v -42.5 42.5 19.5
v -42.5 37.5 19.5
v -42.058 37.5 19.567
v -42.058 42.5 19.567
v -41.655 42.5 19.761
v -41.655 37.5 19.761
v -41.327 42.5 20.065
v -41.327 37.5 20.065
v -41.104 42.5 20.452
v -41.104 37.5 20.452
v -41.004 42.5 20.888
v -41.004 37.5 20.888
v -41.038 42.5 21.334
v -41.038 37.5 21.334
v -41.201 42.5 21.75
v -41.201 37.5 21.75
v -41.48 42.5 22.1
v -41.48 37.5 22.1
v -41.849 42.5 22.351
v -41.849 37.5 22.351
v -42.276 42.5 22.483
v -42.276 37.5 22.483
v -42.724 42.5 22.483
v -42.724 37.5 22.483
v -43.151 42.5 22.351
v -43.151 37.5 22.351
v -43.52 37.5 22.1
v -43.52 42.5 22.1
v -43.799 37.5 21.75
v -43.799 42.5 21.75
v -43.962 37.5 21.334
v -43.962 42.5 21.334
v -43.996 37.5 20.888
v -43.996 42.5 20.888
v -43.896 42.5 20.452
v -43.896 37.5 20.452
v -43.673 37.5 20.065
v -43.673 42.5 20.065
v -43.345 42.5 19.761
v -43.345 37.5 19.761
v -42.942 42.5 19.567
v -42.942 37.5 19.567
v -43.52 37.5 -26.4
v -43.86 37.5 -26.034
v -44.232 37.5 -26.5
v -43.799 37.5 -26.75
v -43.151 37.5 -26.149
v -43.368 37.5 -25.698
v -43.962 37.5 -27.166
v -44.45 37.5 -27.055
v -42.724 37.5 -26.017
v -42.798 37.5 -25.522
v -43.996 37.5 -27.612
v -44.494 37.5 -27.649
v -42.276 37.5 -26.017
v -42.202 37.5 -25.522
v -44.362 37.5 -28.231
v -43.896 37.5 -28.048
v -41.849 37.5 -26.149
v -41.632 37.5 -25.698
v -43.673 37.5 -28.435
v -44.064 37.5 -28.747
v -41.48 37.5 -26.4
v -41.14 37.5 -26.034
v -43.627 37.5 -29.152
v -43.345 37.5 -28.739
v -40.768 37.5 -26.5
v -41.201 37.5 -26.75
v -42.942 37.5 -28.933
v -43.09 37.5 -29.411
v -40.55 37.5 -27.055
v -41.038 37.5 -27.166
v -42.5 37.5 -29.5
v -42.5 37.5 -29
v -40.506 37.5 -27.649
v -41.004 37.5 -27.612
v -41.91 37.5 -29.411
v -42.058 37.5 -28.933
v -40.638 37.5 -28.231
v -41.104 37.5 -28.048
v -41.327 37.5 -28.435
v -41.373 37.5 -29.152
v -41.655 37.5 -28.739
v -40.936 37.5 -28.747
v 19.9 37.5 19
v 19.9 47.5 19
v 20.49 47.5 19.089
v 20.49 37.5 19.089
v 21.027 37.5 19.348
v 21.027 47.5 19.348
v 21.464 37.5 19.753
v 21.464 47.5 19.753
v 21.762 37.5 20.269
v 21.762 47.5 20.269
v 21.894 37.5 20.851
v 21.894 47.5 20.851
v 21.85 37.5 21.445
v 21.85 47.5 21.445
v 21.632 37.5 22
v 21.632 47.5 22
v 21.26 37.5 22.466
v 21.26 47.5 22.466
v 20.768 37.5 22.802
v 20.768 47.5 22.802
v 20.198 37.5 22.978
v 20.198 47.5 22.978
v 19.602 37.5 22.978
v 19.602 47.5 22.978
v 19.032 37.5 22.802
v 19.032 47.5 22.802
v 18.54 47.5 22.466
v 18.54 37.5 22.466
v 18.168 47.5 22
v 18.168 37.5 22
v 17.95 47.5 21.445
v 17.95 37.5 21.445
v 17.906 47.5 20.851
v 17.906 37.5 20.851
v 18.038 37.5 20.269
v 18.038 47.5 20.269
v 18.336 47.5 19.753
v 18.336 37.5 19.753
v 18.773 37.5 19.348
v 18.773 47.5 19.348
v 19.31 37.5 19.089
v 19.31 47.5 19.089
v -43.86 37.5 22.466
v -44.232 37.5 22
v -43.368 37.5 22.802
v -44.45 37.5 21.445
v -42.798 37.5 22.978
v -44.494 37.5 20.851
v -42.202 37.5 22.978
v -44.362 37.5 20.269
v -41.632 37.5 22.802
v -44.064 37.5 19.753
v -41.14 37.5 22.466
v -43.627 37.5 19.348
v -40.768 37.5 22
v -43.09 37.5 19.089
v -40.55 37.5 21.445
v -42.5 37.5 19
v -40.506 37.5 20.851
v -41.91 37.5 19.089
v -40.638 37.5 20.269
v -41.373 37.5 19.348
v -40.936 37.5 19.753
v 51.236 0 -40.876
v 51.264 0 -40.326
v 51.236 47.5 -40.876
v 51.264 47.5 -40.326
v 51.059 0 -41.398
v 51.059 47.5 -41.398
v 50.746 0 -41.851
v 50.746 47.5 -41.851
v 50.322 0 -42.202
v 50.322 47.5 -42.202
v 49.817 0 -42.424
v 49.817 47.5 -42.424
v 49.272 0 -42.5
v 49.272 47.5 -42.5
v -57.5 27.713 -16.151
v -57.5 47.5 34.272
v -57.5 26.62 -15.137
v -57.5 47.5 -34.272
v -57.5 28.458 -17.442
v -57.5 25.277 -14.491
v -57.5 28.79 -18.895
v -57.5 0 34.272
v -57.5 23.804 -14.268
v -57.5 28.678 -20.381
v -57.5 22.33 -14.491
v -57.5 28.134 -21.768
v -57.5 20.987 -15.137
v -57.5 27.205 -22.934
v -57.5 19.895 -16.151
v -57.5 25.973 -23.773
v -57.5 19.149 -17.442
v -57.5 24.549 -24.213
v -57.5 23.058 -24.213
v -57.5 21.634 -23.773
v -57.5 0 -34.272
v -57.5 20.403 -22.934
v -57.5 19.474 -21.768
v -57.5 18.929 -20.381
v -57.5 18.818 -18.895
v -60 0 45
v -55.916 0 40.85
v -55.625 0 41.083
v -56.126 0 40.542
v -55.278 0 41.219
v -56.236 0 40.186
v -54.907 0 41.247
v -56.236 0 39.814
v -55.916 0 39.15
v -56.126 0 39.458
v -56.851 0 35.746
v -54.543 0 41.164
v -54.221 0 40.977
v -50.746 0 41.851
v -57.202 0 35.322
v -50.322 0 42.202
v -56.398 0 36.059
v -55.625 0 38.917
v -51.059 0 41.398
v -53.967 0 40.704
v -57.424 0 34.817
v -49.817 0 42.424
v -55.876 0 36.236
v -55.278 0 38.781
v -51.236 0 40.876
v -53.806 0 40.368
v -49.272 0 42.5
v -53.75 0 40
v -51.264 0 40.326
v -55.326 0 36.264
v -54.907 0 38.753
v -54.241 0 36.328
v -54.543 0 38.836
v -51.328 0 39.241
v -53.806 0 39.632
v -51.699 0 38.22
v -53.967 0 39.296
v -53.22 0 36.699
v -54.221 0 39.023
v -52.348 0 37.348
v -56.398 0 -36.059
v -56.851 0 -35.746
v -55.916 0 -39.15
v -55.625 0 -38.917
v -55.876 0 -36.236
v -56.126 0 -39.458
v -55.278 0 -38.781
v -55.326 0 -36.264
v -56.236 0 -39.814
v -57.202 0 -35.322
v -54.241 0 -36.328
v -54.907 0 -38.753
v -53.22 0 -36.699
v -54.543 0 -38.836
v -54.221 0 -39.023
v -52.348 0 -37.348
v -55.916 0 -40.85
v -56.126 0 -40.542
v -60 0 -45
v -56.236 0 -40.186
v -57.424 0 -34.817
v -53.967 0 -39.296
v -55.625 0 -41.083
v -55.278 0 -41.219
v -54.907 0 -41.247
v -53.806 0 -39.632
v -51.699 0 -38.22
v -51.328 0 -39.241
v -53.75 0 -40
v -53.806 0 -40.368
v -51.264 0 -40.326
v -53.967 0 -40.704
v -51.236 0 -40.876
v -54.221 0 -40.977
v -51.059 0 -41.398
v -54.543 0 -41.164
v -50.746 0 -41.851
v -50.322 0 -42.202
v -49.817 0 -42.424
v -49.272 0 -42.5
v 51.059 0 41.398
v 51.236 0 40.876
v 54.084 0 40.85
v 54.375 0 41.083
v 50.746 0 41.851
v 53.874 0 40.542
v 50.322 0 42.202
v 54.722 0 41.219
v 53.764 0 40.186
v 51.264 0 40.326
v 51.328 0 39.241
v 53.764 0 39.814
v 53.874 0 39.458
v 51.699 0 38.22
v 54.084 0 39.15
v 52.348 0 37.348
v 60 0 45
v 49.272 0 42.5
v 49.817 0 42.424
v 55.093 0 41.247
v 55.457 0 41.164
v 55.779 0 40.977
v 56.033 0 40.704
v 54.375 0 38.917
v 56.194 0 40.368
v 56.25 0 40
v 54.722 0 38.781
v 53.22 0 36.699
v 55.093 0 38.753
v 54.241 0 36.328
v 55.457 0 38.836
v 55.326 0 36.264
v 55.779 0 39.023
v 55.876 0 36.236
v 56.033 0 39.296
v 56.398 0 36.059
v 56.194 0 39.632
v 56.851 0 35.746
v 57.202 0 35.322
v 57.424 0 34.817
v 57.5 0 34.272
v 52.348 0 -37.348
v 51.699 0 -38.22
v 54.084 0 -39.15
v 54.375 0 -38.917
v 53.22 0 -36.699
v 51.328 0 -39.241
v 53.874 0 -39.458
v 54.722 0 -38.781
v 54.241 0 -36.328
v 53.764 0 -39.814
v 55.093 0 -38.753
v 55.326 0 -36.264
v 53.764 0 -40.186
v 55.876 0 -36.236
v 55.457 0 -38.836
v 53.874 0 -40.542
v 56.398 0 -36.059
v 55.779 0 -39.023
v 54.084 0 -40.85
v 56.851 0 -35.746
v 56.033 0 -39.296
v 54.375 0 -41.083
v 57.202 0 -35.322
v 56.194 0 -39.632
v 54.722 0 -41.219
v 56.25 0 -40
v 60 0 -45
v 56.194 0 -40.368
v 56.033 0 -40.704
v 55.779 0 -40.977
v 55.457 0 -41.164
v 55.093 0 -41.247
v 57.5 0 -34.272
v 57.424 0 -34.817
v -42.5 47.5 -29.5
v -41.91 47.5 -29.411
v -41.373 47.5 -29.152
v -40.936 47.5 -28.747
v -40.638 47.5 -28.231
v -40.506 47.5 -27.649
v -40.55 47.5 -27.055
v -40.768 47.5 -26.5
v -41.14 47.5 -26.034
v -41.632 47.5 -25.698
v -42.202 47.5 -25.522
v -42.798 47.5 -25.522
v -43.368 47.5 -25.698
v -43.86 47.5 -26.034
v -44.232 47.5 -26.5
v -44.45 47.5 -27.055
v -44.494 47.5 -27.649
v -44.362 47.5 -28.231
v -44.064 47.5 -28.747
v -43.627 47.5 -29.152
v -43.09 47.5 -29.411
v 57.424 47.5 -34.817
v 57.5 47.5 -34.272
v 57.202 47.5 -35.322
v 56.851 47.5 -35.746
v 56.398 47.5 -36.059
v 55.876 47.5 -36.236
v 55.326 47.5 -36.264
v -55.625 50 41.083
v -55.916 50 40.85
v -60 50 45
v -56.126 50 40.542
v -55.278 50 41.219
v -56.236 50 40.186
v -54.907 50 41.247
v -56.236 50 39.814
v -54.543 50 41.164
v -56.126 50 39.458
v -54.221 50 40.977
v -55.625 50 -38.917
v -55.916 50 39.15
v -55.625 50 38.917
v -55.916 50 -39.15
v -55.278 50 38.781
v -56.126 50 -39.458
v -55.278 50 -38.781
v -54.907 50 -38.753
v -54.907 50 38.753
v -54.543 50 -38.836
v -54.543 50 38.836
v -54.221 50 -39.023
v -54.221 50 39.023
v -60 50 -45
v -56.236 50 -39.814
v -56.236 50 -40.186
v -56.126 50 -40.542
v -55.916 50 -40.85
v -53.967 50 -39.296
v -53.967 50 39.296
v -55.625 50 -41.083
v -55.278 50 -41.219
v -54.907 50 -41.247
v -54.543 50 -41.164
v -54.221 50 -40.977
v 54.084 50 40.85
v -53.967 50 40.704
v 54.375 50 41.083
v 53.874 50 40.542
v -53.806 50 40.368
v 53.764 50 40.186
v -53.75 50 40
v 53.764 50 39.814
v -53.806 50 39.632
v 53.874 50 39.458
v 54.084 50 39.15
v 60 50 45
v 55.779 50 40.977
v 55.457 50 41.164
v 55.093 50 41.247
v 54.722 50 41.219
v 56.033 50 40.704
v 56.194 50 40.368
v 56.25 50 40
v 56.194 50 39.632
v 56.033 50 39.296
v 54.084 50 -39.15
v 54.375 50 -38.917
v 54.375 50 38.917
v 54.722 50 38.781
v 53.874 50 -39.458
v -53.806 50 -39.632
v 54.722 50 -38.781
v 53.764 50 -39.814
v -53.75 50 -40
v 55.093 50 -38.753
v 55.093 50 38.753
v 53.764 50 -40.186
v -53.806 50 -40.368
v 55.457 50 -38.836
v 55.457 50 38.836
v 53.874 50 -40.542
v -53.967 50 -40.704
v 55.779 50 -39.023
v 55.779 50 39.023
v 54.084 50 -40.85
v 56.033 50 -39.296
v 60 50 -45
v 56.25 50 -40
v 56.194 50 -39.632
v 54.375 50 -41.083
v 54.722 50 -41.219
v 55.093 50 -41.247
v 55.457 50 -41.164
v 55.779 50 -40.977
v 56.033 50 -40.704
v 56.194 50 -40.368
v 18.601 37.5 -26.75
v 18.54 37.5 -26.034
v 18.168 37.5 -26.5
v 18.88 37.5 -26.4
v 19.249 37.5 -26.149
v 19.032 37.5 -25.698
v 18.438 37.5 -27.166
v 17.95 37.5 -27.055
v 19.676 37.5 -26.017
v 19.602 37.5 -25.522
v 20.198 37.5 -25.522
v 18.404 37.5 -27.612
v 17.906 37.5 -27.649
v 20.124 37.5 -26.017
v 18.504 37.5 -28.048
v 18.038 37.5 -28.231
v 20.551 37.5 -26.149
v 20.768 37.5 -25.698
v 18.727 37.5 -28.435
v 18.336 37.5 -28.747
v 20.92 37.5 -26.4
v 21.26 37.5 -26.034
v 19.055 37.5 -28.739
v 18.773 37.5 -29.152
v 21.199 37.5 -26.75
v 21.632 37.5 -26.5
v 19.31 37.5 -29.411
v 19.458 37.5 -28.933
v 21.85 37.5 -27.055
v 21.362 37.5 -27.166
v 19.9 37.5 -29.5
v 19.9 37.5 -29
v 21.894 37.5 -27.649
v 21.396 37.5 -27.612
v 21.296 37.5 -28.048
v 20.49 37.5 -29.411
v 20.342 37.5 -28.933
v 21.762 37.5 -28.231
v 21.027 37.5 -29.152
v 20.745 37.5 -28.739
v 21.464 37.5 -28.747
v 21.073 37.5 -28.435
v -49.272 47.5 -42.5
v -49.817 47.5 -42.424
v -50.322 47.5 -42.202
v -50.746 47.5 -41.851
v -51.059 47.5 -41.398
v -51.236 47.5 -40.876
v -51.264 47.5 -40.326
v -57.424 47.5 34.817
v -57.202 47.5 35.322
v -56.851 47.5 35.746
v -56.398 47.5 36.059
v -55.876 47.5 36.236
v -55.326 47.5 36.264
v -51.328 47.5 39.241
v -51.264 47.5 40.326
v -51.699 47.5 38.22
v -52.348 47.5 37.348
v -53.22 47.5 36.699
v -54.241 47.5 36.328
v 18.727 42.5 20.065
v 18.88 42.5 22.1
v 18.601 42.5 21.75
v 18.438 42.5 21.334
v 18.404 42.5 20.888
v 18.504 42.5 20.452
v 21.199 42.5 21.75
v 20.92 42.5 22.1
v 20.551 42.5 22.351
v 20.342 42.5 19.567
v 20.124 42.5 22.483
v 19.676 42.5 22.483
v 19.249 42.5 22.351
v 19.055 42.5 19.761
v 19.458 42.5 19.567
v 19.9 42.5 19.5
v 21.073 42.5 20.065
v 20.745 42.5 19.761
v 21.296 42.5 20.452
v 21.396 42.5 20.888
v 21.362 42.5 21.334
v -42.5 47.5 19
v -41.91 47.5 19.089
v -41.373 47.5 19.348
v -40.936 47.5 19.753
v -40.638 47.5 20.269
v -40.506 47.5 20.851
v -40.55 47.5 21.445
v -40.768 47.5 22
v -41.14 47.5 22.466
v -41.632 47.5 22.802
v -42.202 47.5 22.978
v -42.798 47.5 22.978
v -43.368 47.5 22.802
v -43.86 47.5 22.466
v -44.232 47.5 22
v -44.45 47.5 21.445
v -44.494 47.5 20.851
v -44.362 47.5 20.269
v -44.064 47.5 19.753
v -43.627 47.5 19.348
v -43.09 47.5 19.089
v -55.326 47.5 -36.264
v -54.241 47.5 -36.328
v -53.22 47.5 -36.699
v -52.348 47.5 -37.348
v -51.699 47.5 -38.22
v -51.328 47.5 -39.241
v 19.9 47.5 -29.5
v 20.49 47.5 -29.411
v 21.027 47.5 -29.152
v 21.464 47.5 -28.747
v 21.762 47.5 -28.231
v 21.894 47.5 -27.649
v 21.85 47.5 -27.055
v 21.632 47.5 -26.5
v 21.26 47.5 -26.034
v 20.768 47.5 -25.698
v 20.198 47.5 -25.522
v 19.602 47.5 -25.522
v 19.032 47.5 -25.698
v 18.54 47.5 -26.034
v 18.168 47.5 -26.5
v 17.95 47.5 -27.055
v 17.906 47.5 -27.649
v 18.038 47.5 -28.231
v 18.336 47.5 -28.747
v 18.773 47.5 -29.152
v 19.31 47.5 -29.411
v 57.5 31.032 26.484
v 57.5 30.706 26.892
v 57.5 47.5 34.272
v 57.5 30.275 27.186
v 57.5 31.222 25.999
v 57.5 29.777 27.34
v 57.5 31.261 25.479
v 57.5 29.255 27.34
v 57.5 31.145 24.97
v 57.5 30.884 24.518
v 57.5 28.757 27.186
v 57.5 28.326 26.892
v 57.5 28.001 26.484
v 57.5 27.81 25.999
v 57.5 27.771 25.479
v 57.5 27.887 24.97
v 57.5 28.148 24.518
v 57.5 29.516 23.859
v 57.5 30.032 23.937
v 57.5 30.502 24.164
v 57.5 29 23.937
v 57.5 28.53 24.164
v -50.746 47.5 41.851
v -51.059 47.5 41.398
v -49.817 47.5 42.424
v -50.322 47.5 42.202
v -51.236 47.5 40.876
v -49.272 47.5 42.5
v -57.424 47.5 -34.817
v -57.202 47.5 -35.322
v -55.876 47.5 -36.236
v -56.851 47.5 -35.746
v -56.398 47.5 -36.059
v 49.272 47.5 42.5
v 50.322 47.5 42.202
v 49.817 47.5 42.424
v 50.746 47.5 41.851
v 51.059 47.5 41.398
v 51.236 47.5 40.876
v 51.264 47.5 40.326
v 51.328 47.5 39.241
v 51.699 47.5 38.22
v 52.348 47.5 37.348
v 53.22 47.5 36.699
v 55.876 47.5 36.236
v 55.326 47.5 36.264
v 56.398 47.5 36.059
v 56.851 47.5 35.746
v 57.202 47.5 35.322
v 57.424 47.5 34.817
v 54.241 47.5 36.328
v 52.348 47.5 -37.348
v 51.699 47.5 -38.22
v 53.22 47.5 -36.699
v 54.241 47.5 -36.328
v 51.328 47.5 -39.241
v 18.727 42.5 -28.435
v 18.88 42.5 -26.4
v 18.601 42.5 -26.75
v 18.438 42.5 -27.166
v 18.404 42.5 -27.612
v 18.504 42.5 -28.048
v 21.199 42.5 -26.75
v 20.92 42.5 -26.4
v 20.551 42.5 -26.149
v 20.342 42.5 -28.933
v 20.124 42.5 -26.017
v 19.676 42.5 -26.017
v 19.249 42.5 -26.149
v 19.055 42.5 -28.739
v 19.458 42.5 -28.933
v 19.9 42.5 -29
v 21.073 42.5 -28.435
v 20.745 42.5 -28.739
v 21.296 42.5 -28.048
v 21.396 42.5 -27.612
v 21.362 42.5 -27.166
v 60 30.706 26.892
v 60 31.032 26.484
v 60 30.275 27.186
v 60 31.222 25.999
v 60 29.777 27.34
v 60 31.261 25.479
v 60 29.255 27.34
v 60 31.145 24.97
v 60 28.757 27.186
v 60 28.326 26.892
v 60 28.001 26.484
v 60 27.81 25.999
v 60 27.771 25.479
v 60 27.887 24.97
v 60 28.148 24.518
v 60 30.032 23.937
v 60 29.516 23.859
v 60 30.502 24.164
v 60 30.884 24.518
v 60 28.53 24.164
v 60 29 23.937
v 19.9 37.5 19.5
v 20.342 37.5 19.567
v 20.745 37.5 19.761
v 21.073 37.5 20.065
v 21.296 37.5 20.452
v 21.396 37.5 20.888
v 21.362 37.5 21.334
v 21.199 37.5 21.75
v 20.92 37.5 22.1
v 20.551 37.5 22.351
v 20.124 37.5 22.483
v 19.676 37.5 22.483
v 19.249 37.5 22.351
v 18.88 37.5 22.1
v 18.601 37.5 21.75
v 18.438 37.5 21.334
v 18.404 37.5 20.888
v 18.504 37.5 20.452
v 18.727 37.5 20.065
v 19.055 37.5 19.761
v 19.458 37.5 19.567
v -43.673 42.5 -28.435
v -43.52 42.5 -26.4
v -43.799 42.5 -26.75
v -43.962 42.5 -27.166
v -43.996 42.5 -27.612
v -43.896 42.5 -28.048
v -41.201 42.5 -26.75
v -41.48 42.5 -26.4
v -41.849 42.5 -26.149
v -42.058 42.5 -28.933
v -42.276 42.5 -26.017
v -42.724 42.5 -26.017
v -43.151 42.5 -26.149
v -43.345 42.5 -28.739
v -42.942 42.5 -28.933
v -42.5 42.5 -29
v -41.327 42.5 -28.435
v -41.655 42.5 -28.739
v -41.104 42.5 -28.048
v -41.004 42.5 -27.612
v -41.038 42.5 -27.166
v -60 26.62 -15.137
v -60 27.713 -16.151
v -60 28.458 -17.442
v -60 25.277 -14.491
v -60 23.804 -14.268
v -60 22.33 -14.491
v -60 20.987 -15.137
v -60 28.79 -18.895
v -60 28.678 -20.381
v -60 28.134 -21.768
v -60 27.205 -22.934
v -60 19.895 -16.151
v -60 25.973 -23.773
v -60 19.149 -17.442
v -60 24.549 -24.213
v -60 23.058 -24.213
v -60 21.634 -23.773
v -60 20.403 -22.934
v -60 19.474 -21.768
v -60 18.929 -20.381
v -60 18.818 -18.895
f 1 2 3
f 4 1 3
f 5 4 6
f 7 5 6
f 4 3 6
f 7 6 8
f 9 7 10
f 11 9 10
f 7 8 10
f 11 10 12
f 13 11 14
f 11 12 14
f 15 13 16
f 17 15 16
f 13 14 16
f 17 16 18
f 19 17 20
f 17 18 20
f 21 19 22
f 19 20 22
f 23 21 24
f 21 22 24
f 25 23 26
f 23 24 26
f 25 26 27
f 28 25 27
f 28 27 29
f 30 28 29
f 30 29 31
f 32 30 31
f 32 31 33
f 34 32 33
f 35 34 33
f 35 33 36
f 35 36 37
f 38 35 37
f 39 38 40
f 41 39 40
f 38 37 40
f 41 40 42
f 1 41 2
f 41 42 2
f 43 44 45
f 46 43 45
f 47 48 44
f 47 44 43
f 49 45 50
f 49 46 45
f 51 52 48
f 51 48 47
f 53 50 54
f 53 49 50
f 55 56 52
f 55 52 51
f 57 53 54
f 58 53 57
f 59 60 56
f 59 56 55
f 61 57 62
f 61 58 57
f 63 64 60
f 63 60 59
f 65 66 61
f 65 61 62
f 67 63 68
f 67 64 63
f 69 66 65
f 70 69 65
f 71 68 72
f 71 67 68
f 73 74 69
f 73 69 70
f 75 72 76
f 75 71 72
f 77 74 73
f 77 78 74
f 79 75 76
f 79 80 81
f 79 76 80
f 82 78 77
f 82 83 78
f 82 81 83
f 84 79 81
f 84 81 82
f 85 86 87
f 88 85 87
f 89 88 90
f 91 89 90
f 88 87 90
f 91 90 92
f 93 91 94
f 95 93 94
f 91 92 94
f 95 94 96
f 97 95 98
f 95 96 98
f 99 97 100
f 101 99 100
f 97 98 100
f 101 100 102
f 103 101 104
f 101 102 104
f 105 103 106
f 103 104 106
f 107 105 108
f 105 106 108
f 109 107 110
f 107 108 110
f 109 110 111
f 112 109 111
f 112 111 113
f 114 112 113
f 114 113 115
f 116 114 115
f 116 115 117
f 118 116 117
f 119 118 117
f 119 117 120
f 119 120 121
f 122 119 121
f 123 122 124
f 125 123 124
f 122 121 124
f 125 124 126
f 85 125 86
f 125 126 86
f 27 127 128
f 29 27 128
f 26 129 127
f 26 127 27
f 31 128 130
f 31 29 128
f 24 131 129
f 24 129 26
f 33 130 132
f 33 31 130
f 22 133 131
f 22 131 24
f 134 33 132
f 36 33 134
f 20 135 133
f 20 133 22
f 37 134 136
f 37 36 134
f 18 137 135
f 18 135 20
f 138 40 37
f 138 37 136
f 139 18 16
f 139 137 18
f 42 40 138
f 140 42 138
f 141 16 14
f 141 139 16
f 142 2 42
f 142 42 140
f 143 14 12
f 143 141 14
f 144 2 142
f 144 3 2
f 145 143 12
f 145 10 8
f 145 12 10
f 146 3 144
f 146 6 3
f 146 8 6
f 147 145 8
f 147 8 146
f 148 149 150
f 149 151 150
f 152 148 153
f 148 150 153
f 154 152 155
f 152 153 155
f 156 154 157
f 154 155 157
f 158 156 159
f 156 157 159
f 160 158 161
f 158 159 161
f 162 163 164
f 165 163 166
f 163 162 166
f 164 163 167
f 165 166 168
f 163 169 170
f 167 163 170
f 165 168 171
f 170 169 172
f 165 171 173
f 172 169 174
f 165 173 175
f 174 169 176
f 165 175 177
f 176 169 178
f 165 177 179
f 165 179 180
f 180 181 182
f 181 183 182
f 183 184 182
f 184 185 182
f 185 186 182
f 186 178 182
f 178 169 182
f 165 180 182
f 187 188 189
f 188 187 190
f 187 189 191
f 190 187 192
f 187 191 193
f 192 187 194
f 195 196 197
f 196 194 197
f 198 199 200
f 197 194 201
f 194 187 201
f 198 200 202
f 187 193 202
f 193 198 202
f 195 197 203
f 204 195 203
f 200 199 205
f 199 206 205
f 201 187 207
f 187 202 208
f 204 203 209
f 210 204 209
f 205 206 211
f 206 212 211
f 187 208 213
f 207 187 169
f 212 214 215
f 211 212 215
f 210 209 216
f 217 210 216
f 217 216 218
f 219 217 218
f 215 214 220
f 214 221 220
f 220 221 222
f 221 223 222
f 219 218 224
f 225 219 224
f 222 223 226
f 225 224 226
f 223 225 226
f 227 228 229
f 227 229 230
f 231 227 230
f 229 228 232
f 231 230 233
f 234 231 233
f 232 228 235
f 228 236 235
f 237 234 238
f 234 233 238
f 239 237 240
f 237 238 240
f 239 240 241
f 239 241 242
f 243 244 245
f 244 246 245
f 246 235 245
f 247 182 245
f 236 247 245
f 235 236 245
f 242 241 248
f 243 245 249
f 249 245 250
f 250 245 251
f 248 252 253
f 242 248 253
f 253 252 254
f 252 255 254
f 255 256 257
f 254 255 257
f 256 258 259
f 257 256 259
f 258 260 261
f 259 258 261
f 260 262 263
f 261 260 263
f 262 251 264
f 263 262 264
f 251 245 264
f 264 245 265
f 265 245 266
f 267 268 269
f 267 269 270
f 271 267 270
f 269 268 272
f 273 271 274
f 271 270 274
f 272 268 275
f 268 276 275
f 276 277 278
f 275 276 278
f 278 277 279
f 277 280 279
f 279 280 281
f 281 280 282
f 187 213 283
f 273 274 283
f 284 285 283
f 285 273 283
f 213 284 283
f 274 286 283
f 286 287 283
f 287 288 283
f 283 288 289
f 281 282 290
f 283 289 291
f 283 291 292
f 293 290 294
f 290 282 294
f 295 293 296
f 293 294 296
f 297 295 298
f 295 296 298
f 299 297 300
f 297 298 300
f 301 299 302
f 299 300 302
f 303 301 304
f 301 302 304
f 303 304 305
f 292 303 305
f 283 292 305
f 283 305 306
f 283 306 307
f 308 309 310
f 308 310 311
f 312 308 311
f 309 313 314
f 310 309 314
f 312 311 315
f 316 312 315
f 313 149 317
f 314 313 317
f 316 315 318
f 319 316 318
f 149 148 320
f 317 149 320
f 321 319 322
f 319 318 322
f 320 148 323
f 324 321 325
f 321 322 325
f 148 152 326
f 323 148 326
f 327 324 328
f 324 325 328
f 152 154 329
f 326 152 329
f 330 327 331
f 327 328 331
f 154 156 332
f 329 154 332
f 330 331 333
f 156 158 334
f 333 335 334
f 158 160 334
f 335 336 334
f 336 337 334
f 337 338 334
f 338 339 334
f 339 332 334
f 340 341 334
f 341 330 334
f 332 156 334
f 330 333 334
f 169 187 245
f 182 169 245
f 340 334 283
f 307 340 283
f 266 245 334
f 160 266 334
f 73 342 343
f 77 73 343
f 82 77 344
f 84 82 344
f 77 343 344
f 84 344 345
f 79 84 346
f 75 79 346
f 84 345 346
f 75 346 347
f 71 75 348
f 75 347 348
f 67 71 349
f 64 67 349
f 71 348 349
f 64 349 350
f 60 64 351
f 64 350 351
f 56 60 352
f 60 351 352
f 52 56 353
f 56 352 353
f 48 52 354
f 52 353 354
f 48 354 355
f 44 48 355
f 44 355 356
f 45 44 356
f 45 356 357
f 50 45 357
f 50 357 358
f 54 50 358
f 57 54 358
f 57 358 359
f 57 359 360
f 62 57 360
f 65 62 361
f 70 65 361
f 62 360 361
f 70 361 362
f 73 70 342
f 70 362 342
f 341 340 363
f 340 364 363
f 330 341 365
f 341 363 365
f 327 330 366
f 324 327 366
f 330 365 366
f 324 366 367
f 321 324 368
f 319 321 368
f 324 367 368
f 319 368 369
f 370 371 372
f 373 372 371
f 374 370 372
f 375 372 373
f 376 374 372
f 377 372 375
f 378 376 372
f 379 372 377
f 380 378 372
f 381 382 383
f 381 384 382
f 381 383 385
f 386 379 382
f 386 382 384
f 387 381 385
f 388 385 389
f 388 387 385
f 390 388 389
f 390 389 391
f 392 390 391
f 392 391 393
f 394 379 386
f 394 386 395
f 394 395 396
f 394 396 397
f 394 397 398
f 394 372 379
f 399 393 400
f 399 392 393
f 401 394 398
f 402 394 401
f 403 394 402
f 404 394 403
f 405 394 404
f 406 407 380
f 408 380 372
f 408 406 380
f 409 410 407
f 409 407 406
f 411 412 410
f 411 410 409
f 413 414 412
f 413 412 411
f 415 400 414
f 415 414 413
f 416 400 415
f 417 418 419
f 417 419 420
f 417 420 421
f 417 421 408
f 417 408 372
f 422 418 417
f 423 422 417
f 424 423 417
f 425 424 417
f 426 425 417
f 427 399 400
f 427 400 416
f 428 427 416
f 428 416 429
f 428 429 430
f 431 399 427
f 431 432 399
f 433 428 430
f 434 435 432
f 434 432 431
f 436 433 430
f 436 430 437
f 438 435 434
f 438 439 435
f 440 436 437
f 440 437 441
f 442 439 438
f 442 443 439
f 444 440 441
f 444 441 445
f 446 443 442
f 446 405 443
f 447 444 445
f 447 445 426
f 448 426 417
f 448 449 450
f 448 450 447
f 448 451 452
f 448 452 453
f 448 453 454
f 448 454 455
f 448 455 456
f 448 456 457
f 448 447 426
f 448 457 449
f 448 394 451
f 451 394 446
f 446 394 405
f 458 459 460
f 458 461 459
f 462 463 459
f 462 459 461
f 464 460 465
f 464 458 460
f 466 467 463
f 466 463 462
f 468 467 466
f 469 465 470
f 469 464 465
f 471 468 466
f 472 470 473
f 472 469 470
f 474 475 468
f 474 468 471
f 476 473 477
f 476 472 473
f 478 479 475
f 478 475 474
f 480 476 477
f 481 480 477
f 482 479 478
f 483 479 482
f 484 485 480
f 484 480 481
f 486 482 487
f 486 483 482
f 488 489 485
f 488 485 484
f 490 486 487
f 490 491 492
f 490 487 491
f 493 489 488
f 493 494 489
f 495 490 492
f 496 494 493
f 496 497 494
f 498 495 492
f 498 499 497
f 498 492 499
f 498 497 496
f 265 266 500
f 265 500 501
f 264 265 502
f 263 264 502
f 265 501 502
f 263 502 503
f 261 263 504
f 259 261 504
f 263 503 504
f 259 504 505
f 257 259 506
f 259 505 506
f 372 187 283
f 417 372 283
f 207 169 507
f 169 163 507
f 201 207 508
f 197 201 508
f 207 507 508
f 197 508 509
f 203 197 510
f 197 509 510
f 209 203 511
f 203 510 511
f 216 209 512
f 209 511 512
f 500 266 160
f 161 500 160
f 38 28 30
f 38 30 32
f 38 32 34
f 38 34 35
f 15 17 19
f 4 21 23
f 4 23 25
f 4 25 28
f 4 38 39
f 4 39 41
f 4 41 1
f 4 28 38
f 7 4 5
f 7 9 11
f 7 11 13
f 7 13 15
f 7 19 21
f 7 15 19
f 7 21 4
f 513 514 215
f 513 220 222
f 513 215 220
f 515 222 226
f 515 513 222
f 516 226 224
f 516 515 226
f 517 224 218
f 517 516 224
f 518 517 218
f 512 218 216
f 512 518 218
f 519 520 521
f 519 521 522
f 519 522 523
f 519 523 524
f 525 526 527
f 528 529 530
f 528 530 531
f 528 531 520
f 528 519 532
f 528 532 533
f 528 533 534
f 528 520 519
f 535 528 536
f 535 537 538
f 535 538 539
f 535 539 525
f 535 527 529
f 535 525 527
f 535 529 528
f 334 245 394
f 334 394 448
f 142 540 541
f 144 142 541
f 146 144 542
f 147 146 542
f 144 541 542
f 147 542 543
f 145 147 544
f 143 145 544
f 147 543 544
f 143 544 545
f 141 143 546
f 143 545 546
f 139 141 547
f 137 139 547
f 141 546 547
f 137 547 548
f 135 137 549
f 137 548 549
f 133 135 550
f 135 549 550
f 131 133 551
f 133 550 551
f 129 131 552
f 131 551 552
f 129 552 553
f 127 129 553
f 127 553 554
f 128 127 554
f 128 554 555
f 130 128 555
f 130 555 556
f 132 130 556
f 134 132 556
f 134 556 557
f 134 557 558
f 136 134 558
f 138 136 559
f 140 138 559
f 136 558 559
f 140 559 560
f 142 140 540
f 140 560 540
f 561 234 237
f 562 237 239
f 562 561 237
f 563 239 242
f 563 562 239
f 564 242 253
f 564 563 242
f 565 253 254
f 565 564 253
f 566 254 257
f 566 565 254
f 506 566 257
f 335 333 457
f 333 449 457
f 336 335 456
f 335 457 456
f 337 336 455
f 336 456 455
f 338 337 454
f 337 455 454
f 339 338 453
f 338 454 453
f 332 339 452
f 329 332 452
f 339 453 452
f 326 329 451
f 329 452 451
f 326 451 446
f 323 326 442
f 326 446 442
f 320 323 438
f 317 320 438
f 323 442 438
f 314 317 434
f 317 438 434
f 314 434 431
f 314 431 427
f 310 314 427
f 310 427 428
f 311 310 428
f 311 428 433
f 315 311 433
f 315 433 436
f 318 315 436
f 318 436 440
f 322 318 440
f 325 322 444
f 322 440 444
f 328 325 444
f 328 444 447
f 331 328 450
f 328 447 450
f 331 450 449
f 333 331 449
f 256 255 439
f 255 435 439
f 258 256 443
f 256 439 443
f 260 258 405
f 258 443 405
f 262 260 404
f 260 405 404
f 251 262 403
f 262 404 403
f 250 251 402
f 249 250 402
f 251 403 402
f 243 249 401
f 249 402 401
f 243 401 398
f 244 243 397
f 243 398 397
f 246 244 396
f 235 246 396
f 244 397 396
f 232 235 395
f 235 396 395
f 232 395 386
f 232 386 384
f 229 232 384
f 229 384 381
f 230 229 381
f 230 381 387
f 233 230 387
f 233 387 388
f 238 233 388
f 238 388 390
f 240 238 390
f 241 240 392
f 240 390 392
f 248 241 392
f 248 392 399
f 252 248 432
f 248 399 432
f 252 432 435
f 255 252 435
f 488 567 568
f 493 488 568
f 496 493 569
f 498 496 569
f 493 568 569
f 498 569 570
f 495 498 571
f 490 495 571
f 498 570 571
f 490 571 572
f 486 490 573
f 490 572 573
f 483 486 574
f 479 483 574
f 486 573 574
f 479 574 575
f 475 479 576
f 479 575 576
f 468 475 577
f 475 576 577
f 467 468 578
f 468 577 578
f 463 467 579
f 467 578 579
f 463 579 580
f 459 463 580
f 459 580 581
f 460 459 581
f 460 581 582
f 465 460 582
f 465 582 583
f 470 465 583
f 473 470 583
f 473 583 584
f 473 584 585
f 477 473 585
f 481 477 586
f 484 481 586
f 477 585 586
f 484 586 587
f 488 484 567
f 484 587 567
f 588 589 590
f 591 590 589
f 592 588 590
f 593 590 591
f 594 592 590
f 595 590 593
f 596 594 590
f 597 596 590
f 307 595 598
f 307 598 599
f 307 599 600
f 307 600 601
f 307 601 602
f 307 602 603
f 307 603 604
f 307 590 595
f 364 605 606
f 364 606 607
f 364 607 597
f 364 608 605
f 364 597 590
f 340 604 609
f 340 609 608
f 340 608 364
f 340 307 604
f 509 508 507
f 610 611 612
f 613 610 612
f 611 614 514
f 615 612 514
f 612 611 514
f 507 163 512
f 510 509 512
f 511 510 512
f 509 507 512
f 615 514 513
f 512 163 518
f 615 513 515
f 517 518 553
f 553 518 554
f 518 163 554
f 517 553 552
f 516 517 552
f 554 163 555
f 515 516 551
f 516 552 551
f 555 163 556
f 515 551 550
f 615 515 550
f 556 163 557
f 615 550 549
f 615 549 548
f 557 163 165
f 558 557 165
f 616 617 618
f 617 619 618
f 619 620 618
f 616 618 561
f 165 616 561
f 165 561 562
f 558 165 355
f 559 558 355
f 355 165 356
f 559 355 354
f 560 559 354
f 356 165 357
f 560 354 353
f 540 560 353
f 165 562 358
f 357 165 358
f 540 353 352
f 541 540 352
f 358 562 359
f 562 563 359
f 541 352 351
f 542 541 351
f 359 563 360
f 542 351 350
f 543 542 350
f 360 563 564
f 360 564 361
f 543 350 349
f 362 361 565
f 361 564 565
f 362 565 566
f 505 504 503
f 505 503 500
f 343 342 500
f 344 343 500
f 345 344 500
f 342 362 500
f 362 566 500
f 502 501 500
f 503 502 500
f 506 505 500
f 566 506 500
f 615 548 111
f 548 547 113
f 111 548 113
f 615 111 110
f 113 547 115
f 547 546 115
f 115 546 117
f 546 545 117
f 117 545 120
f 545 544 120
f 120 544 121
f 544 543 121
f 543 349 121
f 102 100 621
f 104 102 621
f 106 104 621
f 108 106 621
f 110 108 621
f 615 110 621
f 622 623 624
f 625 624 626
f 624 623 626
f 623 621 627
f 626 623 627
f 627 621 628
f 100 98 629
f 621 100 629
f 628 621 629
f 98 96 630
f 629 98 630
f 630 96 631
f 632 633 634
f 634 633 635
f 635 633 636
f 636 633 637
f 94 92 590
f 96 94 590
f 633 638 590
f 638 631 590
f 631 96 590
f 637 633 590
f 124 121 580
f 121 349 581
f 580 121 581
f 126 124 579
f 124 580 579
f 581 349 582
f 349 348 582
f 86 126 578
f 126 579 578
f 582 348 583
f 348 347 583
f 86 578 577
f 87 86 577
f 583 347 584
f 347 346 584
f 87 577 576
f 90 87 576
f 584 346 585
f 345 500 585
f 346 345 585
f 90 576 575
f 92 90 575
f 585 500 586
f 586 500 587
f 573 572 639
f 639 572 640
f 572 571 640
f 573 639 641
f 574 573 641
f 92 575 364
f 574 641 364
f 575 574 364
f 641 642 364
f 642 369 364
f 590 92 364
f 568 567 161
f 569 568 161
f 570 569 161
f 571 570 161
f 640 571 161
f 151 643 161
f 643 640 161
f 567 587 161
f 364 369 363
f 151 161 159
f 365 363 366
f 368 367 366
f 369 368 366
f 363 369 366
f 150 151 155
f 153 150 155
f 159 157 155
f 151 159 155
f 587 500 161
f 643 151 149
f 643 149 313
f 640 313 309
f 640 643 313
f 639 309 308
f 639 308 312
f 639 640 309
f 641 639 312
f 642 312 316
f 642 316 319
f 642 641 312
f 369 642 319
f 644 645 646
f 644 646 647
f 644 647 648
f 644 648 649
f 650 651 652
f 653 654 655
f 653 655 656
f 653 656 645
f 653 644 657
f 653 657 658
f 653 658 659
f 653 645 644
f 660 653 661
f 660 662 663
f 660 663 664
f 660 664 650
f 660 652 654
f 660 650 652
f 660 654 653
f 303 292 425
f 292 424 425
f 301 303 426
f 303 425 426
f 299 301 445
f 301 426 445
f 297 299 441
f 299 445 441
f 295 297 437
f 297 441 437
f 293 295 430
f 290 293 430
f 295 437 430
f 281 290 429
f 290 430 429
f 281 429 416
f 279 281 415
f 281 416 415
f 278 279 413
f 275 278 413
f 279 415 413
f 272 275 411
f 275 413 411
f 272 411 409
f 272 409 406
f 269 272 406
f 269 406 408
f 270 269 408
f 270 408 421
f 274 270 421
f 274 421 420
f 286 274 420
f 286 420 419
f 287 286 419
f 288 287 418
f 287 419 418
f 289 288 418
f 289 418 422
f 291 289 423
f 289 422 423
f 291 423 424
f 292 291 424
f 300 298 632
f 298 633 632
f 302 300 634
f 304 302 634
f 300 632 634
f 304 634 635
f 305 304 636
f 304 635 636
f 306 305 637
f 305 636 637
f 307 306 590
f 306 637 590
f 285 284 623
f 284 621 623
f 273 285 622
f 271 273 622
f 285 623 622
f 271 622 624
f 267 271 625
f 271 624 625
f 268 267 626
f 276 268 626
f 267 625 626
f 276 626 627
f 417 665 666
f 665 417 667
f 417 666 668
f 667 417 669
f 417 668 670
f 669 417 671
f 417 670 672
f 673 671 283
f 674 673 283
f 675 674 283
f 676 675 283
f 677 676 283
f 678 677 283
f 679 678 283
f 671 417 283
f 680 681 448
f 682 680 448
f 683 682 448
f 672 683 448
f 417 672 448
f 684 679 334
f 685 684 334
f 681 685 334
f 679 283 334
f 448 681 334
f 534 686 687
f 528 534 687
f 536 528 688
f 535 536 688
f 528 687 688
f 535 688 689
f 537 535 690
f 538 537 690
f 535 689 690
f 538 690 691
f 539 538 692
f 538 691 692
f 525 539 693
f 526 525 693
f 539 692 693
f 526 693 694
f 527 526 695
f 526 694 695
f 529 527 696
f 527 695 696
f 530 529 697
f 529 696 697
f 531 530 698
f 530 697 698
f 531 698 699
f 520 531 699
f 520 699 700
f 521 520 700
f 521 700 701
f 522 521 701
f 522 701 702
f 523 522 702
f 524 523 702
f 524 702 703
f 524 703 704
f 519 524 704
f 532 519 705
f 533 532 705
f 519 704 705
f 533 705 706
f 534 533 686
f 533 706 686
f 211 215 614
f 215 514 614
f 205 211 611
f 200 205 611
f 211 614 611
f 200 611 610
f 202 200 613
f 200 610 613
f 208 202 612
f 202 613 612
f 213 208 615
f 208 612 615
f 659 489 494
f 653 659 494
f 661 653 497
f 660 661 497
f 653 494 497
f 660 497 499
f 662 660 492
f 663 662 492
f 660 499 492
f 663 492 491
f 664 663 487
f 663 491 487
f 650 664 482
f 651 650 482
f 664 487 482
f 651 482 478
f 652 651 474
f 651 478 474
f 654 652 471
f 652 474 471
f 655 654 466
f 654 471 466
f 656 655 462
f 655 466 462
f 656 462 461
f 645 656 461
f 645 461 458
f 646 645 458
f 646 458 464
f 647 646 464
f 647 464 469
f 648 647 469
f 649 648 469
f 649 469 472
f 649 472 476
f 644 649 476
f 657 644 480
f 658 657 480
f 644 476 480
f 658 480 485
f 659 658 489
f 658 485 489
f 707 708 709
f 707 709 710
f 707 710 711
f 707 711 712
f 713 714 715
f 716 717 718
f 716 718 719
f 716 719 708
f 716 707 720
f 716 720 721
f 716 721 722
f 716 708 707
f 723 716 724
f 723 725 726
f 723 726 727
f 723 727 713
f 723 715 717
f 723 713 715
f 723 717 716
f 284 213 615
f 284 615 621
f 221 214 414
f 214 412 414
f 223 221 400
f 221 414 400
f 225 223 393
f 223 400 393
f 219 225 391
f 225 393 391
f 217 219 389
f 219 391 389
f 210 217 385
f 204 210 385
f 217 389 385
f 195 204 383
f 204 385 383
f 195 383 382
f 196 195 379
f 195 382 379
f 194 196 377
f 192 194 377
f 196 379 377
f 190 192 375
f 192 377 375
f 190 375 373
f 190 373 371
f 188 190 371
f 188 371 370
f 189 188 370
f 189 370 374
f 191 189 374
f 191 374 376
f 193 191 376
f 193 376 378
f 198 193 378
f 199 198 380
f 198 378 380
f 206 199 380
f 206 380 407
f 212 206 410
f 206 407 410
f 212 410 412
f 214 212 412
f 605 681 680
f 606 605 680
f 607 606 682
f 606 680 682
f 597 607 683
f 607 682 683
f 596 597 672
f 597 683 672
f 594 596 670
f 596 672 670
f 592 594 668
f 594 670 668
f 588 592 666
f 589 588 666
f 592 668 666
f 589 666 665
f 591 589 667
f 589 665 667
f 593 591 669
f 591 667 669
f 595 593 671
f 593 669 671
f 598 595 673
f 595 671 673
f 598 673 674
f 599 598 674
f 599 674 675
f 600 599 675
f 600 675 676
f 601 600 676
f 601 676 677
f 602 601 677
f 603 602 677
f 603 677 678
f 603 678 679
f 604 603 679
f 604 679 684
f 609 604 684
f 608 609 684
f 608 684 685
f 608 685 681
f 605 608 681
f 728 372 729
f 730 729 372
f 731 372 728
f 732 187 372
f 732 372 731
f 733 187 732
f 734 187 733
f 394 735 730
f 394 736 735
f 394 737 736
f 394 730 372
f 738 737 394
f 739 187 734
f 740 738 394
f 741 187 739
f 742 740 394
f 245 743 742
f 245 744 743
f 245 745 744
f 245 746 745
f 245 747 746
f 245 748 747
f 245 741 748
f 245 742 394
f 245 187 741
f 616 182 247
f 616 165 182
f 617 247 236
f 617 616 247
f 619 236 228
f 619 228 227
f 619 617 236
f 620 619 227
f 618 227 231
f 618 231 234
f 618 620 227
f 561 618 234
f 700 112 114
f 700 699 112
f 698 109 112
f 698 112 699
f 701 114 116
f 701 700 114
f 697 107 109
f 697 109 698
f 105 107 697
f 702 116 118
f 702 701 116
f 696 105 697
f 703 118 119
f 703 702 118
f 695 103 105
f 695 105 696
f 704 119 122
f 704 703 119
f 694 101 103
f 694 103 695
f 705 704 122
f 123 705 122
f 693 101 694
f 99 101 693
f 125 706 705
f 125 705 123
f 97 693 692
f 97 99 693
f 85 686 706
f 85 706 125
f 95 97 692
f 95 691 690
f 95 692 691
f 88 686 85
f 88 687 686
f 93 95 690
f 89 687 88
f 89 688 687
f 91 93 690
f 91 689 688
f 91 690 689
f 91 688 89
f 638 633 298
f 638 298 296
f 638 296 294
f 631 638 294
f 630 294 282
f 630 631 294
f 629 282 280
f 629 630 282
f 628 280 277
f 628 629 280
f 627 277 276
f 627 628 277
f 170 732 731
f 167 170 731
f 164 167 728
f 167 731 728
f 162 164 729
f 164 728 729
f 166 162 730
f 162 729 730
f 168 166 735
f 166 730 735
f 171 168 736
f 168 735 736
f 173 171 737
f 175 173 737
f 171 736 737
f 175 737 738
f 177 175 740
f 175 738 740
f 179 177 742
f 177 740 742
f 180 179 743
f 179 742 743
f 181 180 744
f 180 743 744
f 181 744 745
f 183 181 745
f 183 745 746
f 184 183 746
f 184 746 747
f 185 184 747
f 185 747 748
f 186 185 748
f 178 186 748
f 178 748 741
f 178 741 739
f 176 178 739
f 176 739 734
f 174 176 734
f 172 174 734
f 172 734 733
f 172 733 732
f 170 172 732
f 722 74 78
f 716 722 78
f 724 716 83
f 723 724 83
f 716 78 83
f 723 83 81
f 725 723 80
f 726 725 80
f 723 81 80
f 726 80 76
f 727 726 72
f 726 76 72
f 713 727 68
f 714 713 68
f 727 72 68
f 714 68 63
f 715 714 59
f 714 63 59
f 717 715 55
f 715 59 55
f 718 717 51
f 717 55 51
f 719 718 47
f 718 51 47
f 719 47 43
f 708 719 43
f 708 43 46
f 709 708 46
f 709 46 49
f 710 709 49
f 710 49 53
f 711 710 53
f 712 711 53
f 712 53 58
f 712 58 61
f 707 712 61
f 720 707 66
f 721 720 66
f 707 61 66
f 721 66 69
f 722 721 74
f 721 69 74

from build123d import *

# Parameters (mm, degrees)
SKETCH1_W             = 120
SKETCH1_H             = 90
BOSS_EXTRUDE1_DEPTH   = 50
M3_TAPPED_HOLE1_D     = 2.5
M3_TAPPED_HOLE1_DEPTH = 50
M3_TAPPED_HOLE1_TIP   = 0.751075774
SHELL2_T              = -2.5
FILLET2_R             = 2
CUT_EXTRUDE2_REACH    = 139.568
SKETCH13_R            = 5
CUT_EXTRUDE3_REACH    = 139.568
SKETCH14_R            = 1.75
SKETCH15_R            = 2
BOSS_EXTRUDE2_DEPTH   = 10
SKETCH16_R            = 1.5
CUT_EXTRUDE4_DEPTH    = 5


with BuildPart() as part:
    # Sketch1 → Boss-Extrude1 (new body)
    with BuildSketch(Plane(origin=(0, 0, 0), x_dir=(1, 0, 0), z_dir=(0, 1, 0))):
        Rectangle(SKETCH1_W, SKETCH1_H)
    extrude(amount=BOSS_EXTRUDE1_DEPTH)

    # M3 Tapped Hole1
    with Locations(Plane(origin=(0, 0, 0), x_dir=(-1, 0, 0), z_dir=(0, -1, 0))):
        with Locations((55, -40), (55, 40), (-55, 40), (-55, -40)):
            Hole(M3_TAPPED_HOLE1_D / 2, depth=M3_TAPPED_HOLE1_DEPTH)
            with Locations((0, 0, -(M3_TAPPED_HOLE1_DEPTH + M3_TAPPED_HOLE1_TIP / 2))):  # 118° drill point
                Cone(0, M3_TAPPED_HOLE1_D / 2, M3_TAPPED_HOLE1_TIP, mode=Mode.SUBTRACT)

    # Shell2
    shell2_openings = [part.faces().sort_by_distance(p)[0] for p in [
        (0, 0, 0),
    ]]
    offset(amount=SHELL2_T, openings=shell2_openings, kind=Kind.INTERSECTION)

    # Fillet2
    fillet2_edges = [part.edges().sort_by_distance(p)[0] for p in [
        (-52.204915028, 23.75, 42.5),
        (-57.5, 23.75, -37.204915028),
        (-52.204915028, 23.75, -42.5),
        (52.204915028, 23.75, -42.5),
        (57.5, 23.75, -37.204915028),
        (57.5, 23.75, 37.204915028),
        (52.204915028, 23.75, 42.5),
        (-57.5, 23.75, 37.204915028),
    ]]
    fillet(fillet2_edges, radius=FILLET2_R)

    # Sketch13 → Cut-Extrude2 (cut, up to next)
    with BuildSketch(Plane.ZY.offset(60), mode=Mode.PRIVATE) as cut_extrude2_sk1:
        with Locations((-19.268421651, 23.803658595)):
            Circle(SKETCH13_R)
    cut_extrude2_tool1 = extrude(cut_extrude2_sk1.sketch, amount=-CUT_EXTRUDE2_REACH, mode=Mode.PRIVATE) & part.part
    add(cut_extrude2_tool1.solids().sort_by_distance((-60, 23.803659, -19.268422))[0], mode=Mode.SUBTRACT)

    # Sketch14 → Cut-Extrude3 (cut, up to next)
    with BuildSketch(Plane(origin=(60, 0, 0), x_dir=(0, 0, -1), z_dir=(1, 0, 0)), mode=Mode.PRIVATE) as cut_extrude3_sk1:
        with Locations((-25.609467242, 29.516078094)):
            Circle(SKETCH14_R)
    cut_extrude3_tool1 = extrude(cut_extrude3_sk1.sketch, amount=-CUT_EXTRUDE3_REACH, mode=Mode.PRIVATE) & part.part
    add(cut_extrude3_tool1.solids().sort_by_distance((60, 29.516078, 25.609467))[0], mode=Mode.SUBTRACT)

    # Sketch15 → Boss-Extrude2 (add)
    with BuildSketch(Plane.XZ.offset(-47.5)):
        with Locations((-42.5, -27.5)):
            Circle(SKETCH15_R)
        with Locations((-42.5, 21)):
            Circle(SKETCH15_R)
        with Locations((19.9, -27.5)):
            Circle(SKETCH15_R)
        with Locations((19.9, 21)):
            Circle(SKETCH15_R)
    extrude(amount=BOSS_EXTRUDE2_DEPTH)

    # Sketch16 → Cut-Extrude4 (cut)
    with BuildSketch(Plane.XZ.offset(-37.5)):
        with Locations((-42.5, 21)):
            Circle(SKETCH16_R)
        with Locations((19.9, 21)):
            Circle(SKETCH16_R)
        with Locations((-42.5, -27.5)):
            Circle(SKETCH16_R)
        with Locations((19.9, -27.5)):
            Circle(SKETCH16_R)
    extrude(amount=-CUT_EXTRUDE4_DEPTH, mode=Mode.SUBTRACT)


solid = part.part
